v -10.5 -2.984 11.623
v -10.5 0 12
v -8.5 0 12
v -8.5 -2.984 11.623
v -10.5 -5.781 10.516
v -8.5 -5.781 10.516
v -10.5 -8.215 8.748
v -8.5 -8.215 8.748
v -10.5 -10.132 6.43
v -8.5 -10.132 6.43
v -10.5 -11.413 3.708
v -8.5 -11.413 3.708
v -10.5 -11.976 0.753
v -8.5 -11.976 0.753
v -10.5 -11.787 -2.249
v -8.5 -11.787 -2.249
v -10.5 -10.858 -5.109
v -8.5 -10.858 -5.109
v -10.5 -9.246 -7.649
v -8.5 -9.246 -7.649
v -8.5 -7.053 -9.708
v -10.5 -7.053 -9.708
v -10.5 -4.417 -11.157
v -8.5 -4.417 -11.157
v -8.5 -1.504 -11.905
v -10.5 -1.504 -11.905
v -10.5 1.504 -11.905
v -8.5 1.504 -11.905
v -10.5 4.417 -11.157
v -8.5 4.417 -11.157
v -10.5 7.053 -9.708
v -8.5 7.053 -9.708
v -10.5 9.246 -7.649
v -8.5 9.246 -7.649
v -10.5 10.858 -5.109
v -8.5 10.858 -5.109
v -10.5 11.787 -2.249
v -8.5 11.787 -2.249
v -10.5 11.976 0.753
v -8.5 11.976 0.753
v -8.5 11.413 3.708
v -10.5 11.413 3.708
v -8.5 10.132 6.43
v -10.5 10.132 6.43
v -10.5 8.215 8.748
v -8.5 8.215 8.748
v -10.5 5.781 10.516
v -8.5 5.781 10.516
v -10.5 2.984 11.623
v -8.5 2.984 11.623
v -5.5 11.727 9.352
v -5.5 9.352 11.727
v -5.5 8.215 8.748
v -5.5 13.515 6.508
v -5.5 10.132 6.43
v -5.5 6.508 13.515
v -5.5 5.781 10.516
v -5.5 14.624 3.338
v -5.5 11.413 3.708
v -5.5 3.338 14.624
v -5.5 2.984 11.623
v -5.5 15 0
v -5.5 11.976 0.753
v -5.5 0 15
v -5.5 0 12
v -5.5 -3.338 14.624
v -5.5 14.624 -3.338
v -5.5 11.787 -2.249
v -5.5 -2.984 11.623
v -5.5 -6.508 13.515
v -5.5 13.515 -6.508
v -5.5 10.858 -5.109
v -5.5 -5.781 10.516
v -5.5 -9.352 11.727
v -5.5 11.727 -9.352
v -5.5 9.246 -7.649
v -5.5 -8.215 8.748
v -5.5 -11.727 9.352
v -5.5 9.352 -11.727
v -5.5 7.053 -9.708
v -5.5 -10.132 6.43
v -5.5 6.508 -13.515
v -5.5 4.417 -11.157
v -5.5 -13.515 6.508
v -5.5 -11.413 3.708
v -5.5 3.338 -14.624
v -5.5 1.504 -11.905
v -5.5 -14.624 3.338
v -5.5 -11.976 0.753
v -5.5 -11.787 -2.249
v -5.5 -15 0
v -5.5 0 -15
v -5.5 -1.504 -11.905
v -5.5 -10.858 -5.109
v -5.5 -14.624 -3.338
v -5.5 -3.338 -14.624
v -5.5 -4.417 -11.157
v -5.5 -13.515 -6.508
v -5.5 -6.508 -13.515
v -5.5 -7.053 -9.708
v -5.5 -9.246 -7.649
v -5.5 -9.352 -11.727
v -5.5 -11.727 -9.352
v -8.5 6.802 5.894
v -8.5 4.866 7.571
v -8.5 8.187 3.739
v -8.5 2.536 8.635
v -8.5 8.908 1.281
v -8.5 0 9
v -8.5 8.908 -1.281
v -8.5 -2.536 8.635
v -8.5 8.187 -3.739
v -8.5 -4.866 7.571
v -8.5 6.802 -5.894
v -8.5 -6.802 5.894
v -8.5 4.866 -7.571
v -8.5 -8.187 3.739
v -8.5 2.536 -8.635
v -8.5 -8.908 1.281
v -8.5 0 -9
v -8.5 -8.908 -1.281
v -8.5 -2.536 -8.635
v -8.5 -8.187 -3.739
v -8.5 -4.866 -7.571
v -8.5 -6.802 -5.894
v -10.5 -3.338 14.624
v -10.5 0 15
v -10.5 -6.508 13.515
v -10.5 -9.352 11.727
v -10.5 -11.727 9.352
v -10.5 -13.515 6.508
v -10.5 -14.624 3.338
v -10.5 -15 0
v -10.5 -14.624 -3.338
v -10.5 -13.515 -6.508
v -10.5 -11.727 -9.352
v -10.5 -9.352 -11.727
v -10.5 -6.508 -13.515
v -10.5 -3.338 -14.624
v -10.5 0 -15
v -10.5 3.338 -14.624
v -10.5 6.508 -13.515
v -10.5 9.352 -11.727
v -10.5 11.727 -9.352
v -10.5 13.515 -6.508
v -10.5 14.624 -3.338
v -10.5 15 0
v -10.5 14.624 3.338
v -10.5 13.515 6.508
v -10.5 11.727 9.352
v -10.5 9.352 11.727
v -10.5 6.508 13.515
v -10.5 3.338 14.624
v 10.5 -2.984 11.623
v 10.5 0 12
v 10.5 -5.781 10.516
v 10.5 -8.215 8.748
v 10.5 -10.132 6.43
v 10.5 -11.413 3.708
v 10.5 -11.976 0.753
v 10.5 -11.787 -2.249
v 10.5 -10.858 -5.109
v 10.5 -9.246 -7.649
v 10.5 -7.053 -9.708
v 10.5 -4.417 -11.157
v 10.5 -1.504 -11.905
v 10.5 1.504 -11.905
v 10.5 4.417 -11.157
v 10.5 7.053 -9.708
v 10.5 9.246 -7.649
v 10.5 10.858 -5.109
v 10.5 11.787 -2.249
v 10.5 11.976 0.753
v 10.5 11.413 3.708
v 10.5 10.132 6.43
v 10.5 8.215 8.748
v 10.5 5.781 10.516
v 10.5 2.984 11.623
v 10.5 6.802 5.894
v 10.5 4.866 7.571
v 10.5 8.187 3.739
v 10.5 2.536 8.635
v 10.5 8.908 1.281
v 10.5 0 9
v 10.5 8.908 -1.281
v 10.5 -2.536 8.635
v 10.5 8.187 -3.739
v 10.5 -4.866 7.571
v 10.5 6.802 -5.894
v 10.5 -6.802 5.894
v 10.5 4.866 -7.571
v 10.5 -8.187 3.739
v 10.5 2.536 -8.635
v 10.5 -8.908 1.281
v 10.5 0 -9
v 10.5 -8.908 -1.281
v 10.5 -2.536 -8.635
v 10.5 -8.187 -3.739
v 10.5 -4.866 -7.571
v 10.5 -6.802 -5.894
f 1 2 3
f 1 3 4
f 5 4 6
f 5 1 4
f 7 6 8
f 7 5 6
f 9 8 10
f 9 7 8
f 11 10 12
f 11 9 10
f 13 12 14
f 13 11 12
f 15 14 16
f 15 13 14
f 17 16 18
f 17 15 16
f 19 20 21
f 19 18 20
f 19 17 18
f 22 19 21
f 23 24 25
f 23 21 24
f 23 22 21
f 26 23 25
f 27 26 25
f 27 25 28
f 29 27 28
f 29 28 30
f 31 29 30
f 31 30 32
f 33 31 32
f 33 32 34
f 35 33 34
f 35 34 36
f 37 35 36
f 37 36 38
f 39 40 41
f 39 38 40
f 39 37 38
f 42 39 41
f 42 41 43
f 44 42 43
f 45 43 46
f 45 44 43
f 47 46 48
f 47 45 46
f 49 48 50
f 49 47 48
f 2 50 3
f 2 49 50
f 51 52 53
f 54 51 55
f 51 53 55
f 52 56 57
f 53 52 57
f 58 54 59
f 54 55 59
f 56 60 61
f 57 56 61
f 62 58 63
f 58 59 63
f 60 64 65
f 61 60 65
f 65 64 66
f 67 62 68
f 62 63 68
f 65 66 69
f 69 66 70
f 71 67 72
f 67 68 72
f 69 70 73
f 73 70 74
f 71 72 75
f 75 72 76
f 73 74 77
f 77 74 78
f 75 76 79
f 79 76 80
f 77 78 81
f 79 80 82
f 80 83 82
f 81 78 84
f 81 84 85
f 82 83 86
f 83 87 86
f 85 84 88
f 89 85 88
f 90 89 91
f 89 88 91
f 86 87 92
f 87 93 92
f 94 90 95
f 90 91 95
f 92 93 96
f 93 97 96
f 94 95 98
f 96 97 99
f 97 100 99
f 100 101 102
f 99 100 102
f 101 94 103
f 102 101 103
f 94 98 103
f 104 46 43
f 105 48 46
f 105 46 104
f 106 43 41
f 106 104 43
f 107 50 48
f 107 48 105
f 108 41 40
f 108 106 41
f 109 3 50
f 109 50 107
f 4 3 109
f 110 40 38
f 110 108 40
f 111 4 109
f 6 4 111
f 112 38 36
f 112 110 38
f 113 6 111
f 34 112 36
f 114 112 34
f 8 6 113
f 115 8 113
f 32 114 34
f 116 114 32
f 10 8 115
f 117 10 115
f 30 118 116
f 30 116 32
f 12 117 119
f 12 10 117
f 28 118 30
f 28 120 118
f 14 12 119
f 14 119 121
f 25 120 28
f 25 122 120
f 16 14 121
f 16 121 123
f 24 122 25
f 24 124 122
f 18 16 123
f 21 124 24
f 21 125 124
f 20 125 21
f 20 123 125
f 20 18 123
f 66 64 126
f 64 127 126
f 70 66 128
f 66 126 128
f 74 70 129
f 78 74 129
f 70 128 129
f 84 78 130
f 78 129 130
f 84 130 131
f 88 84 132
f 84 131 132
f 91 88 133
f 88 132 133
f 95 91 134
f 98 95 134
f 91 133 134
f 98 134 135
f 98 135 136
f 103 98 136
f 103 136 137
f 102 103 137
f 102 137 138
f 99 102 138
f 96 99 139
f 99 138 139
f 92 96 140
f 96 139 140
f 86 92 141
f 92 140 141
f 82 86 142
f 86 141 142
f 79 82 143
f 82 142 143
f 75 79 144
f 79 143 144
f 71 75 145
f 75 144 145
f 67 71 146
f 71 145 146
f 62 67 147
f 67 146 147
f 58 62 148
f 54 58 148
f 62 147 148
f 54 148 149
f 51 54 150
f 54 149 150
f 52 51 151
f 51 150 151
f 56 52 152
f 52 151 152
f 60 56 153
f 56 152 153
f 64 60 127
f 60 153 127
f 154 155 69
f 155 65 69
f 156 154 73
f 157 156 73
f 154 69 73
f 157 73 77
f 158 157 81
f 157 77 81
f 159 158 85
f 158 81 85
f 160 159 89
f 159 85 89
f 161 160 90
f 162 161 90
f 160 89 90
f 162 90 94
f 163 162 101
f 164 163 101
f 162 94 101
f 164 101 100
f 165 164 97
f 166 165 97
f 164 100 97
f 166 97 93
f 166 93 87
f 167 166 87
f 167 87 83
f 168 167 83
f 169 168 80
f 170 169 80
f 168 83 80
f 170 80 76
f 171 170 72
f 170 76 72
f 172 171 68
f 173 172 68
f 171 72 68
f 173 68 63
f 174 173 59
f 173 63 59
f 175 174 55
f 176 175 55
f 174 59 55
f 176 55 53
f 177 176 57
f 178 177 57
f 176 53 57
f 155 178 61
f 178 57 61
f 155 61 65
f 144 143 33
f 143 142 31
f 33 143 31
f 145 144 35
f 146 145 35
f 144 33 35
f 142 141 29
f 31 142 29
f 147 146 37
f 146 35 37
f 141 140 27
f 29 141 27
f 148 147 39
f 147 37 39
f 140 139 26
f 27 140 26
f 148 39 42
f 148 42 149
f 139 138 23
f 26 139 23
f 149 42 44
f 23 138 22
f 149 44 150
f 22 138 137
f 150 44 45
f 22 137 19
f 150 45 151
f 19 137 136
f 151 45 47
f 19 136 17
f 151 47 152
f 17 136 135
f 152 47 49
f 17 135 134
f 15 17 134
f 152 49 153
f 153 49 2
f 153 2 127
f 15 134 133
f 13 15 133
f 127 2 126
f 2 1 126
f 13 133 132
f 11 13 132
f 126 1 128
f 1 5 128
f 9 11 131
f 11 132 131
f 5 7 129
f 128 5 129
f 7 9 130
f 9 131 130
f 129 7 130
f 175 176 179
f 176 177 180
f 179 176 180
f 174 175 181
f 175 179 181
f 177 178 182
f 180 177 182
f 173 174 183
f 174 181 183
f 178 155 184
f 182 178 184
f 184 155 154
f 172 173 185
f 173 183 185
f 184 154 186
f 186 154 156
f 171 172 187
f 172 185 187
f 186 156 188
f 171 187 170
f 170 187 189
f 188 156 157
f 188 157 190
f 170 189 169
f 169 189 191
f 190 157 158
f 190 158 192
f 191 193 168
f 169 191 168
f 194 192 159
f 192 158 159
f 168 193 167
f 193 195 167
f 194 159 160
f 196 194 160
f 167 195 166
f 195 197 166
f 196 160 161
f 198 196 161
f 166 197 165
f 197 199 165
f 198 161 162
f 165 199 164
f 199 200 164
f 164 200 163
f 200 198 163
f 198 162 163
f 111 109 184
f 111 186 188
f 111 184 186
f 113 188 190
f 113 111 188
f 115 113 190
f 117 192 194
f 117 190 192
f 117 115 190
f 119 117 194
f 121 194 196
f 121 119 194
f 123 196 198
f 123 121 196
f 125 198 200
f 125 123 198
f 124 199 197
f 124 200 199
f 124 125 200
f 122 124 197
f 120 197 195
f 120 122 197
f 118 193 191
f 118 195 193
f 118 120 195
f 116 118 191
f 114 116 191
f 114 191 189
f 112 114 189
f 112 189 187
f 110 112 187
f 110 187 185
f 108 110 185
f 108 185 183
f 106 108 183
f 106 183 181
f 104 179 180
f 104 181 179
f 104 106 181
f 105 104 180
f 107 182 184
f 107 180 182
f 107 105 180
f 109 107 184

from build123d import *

# Parameters (mm, degrees)
SHELL2_T = -3


with BuildPart() as part:
    # Sketch5 → Revolve11 (revolve)
    with BuildSketch(Plane.XY, mode=Mode.PRIVATE) as revolve11_sk:
        Polygon((-10.5, 0), (10.5, 0), (10.5, 12), (-5.5, 12), (-5.5, 15), (-10.5, 15), align=None)
    revolve(revolve11_sk.sketch.rotate(Axis((-10.5, 0, 0), (1, 0, 0)), 90), axis=Axis((-10.5, 0, 0), (1, 0, 0)))

    # Shell2
    shell2_openings = [part.faces().sort_by_distance(p)[0] for p in [
        (10.5, 0, 0),
        (-10.5, 0, 0),
    ]]
    offset(amount=SHELL2_T, openings=shell2_openings, kind=Kind.INTERSECTION)


solid = part.part
